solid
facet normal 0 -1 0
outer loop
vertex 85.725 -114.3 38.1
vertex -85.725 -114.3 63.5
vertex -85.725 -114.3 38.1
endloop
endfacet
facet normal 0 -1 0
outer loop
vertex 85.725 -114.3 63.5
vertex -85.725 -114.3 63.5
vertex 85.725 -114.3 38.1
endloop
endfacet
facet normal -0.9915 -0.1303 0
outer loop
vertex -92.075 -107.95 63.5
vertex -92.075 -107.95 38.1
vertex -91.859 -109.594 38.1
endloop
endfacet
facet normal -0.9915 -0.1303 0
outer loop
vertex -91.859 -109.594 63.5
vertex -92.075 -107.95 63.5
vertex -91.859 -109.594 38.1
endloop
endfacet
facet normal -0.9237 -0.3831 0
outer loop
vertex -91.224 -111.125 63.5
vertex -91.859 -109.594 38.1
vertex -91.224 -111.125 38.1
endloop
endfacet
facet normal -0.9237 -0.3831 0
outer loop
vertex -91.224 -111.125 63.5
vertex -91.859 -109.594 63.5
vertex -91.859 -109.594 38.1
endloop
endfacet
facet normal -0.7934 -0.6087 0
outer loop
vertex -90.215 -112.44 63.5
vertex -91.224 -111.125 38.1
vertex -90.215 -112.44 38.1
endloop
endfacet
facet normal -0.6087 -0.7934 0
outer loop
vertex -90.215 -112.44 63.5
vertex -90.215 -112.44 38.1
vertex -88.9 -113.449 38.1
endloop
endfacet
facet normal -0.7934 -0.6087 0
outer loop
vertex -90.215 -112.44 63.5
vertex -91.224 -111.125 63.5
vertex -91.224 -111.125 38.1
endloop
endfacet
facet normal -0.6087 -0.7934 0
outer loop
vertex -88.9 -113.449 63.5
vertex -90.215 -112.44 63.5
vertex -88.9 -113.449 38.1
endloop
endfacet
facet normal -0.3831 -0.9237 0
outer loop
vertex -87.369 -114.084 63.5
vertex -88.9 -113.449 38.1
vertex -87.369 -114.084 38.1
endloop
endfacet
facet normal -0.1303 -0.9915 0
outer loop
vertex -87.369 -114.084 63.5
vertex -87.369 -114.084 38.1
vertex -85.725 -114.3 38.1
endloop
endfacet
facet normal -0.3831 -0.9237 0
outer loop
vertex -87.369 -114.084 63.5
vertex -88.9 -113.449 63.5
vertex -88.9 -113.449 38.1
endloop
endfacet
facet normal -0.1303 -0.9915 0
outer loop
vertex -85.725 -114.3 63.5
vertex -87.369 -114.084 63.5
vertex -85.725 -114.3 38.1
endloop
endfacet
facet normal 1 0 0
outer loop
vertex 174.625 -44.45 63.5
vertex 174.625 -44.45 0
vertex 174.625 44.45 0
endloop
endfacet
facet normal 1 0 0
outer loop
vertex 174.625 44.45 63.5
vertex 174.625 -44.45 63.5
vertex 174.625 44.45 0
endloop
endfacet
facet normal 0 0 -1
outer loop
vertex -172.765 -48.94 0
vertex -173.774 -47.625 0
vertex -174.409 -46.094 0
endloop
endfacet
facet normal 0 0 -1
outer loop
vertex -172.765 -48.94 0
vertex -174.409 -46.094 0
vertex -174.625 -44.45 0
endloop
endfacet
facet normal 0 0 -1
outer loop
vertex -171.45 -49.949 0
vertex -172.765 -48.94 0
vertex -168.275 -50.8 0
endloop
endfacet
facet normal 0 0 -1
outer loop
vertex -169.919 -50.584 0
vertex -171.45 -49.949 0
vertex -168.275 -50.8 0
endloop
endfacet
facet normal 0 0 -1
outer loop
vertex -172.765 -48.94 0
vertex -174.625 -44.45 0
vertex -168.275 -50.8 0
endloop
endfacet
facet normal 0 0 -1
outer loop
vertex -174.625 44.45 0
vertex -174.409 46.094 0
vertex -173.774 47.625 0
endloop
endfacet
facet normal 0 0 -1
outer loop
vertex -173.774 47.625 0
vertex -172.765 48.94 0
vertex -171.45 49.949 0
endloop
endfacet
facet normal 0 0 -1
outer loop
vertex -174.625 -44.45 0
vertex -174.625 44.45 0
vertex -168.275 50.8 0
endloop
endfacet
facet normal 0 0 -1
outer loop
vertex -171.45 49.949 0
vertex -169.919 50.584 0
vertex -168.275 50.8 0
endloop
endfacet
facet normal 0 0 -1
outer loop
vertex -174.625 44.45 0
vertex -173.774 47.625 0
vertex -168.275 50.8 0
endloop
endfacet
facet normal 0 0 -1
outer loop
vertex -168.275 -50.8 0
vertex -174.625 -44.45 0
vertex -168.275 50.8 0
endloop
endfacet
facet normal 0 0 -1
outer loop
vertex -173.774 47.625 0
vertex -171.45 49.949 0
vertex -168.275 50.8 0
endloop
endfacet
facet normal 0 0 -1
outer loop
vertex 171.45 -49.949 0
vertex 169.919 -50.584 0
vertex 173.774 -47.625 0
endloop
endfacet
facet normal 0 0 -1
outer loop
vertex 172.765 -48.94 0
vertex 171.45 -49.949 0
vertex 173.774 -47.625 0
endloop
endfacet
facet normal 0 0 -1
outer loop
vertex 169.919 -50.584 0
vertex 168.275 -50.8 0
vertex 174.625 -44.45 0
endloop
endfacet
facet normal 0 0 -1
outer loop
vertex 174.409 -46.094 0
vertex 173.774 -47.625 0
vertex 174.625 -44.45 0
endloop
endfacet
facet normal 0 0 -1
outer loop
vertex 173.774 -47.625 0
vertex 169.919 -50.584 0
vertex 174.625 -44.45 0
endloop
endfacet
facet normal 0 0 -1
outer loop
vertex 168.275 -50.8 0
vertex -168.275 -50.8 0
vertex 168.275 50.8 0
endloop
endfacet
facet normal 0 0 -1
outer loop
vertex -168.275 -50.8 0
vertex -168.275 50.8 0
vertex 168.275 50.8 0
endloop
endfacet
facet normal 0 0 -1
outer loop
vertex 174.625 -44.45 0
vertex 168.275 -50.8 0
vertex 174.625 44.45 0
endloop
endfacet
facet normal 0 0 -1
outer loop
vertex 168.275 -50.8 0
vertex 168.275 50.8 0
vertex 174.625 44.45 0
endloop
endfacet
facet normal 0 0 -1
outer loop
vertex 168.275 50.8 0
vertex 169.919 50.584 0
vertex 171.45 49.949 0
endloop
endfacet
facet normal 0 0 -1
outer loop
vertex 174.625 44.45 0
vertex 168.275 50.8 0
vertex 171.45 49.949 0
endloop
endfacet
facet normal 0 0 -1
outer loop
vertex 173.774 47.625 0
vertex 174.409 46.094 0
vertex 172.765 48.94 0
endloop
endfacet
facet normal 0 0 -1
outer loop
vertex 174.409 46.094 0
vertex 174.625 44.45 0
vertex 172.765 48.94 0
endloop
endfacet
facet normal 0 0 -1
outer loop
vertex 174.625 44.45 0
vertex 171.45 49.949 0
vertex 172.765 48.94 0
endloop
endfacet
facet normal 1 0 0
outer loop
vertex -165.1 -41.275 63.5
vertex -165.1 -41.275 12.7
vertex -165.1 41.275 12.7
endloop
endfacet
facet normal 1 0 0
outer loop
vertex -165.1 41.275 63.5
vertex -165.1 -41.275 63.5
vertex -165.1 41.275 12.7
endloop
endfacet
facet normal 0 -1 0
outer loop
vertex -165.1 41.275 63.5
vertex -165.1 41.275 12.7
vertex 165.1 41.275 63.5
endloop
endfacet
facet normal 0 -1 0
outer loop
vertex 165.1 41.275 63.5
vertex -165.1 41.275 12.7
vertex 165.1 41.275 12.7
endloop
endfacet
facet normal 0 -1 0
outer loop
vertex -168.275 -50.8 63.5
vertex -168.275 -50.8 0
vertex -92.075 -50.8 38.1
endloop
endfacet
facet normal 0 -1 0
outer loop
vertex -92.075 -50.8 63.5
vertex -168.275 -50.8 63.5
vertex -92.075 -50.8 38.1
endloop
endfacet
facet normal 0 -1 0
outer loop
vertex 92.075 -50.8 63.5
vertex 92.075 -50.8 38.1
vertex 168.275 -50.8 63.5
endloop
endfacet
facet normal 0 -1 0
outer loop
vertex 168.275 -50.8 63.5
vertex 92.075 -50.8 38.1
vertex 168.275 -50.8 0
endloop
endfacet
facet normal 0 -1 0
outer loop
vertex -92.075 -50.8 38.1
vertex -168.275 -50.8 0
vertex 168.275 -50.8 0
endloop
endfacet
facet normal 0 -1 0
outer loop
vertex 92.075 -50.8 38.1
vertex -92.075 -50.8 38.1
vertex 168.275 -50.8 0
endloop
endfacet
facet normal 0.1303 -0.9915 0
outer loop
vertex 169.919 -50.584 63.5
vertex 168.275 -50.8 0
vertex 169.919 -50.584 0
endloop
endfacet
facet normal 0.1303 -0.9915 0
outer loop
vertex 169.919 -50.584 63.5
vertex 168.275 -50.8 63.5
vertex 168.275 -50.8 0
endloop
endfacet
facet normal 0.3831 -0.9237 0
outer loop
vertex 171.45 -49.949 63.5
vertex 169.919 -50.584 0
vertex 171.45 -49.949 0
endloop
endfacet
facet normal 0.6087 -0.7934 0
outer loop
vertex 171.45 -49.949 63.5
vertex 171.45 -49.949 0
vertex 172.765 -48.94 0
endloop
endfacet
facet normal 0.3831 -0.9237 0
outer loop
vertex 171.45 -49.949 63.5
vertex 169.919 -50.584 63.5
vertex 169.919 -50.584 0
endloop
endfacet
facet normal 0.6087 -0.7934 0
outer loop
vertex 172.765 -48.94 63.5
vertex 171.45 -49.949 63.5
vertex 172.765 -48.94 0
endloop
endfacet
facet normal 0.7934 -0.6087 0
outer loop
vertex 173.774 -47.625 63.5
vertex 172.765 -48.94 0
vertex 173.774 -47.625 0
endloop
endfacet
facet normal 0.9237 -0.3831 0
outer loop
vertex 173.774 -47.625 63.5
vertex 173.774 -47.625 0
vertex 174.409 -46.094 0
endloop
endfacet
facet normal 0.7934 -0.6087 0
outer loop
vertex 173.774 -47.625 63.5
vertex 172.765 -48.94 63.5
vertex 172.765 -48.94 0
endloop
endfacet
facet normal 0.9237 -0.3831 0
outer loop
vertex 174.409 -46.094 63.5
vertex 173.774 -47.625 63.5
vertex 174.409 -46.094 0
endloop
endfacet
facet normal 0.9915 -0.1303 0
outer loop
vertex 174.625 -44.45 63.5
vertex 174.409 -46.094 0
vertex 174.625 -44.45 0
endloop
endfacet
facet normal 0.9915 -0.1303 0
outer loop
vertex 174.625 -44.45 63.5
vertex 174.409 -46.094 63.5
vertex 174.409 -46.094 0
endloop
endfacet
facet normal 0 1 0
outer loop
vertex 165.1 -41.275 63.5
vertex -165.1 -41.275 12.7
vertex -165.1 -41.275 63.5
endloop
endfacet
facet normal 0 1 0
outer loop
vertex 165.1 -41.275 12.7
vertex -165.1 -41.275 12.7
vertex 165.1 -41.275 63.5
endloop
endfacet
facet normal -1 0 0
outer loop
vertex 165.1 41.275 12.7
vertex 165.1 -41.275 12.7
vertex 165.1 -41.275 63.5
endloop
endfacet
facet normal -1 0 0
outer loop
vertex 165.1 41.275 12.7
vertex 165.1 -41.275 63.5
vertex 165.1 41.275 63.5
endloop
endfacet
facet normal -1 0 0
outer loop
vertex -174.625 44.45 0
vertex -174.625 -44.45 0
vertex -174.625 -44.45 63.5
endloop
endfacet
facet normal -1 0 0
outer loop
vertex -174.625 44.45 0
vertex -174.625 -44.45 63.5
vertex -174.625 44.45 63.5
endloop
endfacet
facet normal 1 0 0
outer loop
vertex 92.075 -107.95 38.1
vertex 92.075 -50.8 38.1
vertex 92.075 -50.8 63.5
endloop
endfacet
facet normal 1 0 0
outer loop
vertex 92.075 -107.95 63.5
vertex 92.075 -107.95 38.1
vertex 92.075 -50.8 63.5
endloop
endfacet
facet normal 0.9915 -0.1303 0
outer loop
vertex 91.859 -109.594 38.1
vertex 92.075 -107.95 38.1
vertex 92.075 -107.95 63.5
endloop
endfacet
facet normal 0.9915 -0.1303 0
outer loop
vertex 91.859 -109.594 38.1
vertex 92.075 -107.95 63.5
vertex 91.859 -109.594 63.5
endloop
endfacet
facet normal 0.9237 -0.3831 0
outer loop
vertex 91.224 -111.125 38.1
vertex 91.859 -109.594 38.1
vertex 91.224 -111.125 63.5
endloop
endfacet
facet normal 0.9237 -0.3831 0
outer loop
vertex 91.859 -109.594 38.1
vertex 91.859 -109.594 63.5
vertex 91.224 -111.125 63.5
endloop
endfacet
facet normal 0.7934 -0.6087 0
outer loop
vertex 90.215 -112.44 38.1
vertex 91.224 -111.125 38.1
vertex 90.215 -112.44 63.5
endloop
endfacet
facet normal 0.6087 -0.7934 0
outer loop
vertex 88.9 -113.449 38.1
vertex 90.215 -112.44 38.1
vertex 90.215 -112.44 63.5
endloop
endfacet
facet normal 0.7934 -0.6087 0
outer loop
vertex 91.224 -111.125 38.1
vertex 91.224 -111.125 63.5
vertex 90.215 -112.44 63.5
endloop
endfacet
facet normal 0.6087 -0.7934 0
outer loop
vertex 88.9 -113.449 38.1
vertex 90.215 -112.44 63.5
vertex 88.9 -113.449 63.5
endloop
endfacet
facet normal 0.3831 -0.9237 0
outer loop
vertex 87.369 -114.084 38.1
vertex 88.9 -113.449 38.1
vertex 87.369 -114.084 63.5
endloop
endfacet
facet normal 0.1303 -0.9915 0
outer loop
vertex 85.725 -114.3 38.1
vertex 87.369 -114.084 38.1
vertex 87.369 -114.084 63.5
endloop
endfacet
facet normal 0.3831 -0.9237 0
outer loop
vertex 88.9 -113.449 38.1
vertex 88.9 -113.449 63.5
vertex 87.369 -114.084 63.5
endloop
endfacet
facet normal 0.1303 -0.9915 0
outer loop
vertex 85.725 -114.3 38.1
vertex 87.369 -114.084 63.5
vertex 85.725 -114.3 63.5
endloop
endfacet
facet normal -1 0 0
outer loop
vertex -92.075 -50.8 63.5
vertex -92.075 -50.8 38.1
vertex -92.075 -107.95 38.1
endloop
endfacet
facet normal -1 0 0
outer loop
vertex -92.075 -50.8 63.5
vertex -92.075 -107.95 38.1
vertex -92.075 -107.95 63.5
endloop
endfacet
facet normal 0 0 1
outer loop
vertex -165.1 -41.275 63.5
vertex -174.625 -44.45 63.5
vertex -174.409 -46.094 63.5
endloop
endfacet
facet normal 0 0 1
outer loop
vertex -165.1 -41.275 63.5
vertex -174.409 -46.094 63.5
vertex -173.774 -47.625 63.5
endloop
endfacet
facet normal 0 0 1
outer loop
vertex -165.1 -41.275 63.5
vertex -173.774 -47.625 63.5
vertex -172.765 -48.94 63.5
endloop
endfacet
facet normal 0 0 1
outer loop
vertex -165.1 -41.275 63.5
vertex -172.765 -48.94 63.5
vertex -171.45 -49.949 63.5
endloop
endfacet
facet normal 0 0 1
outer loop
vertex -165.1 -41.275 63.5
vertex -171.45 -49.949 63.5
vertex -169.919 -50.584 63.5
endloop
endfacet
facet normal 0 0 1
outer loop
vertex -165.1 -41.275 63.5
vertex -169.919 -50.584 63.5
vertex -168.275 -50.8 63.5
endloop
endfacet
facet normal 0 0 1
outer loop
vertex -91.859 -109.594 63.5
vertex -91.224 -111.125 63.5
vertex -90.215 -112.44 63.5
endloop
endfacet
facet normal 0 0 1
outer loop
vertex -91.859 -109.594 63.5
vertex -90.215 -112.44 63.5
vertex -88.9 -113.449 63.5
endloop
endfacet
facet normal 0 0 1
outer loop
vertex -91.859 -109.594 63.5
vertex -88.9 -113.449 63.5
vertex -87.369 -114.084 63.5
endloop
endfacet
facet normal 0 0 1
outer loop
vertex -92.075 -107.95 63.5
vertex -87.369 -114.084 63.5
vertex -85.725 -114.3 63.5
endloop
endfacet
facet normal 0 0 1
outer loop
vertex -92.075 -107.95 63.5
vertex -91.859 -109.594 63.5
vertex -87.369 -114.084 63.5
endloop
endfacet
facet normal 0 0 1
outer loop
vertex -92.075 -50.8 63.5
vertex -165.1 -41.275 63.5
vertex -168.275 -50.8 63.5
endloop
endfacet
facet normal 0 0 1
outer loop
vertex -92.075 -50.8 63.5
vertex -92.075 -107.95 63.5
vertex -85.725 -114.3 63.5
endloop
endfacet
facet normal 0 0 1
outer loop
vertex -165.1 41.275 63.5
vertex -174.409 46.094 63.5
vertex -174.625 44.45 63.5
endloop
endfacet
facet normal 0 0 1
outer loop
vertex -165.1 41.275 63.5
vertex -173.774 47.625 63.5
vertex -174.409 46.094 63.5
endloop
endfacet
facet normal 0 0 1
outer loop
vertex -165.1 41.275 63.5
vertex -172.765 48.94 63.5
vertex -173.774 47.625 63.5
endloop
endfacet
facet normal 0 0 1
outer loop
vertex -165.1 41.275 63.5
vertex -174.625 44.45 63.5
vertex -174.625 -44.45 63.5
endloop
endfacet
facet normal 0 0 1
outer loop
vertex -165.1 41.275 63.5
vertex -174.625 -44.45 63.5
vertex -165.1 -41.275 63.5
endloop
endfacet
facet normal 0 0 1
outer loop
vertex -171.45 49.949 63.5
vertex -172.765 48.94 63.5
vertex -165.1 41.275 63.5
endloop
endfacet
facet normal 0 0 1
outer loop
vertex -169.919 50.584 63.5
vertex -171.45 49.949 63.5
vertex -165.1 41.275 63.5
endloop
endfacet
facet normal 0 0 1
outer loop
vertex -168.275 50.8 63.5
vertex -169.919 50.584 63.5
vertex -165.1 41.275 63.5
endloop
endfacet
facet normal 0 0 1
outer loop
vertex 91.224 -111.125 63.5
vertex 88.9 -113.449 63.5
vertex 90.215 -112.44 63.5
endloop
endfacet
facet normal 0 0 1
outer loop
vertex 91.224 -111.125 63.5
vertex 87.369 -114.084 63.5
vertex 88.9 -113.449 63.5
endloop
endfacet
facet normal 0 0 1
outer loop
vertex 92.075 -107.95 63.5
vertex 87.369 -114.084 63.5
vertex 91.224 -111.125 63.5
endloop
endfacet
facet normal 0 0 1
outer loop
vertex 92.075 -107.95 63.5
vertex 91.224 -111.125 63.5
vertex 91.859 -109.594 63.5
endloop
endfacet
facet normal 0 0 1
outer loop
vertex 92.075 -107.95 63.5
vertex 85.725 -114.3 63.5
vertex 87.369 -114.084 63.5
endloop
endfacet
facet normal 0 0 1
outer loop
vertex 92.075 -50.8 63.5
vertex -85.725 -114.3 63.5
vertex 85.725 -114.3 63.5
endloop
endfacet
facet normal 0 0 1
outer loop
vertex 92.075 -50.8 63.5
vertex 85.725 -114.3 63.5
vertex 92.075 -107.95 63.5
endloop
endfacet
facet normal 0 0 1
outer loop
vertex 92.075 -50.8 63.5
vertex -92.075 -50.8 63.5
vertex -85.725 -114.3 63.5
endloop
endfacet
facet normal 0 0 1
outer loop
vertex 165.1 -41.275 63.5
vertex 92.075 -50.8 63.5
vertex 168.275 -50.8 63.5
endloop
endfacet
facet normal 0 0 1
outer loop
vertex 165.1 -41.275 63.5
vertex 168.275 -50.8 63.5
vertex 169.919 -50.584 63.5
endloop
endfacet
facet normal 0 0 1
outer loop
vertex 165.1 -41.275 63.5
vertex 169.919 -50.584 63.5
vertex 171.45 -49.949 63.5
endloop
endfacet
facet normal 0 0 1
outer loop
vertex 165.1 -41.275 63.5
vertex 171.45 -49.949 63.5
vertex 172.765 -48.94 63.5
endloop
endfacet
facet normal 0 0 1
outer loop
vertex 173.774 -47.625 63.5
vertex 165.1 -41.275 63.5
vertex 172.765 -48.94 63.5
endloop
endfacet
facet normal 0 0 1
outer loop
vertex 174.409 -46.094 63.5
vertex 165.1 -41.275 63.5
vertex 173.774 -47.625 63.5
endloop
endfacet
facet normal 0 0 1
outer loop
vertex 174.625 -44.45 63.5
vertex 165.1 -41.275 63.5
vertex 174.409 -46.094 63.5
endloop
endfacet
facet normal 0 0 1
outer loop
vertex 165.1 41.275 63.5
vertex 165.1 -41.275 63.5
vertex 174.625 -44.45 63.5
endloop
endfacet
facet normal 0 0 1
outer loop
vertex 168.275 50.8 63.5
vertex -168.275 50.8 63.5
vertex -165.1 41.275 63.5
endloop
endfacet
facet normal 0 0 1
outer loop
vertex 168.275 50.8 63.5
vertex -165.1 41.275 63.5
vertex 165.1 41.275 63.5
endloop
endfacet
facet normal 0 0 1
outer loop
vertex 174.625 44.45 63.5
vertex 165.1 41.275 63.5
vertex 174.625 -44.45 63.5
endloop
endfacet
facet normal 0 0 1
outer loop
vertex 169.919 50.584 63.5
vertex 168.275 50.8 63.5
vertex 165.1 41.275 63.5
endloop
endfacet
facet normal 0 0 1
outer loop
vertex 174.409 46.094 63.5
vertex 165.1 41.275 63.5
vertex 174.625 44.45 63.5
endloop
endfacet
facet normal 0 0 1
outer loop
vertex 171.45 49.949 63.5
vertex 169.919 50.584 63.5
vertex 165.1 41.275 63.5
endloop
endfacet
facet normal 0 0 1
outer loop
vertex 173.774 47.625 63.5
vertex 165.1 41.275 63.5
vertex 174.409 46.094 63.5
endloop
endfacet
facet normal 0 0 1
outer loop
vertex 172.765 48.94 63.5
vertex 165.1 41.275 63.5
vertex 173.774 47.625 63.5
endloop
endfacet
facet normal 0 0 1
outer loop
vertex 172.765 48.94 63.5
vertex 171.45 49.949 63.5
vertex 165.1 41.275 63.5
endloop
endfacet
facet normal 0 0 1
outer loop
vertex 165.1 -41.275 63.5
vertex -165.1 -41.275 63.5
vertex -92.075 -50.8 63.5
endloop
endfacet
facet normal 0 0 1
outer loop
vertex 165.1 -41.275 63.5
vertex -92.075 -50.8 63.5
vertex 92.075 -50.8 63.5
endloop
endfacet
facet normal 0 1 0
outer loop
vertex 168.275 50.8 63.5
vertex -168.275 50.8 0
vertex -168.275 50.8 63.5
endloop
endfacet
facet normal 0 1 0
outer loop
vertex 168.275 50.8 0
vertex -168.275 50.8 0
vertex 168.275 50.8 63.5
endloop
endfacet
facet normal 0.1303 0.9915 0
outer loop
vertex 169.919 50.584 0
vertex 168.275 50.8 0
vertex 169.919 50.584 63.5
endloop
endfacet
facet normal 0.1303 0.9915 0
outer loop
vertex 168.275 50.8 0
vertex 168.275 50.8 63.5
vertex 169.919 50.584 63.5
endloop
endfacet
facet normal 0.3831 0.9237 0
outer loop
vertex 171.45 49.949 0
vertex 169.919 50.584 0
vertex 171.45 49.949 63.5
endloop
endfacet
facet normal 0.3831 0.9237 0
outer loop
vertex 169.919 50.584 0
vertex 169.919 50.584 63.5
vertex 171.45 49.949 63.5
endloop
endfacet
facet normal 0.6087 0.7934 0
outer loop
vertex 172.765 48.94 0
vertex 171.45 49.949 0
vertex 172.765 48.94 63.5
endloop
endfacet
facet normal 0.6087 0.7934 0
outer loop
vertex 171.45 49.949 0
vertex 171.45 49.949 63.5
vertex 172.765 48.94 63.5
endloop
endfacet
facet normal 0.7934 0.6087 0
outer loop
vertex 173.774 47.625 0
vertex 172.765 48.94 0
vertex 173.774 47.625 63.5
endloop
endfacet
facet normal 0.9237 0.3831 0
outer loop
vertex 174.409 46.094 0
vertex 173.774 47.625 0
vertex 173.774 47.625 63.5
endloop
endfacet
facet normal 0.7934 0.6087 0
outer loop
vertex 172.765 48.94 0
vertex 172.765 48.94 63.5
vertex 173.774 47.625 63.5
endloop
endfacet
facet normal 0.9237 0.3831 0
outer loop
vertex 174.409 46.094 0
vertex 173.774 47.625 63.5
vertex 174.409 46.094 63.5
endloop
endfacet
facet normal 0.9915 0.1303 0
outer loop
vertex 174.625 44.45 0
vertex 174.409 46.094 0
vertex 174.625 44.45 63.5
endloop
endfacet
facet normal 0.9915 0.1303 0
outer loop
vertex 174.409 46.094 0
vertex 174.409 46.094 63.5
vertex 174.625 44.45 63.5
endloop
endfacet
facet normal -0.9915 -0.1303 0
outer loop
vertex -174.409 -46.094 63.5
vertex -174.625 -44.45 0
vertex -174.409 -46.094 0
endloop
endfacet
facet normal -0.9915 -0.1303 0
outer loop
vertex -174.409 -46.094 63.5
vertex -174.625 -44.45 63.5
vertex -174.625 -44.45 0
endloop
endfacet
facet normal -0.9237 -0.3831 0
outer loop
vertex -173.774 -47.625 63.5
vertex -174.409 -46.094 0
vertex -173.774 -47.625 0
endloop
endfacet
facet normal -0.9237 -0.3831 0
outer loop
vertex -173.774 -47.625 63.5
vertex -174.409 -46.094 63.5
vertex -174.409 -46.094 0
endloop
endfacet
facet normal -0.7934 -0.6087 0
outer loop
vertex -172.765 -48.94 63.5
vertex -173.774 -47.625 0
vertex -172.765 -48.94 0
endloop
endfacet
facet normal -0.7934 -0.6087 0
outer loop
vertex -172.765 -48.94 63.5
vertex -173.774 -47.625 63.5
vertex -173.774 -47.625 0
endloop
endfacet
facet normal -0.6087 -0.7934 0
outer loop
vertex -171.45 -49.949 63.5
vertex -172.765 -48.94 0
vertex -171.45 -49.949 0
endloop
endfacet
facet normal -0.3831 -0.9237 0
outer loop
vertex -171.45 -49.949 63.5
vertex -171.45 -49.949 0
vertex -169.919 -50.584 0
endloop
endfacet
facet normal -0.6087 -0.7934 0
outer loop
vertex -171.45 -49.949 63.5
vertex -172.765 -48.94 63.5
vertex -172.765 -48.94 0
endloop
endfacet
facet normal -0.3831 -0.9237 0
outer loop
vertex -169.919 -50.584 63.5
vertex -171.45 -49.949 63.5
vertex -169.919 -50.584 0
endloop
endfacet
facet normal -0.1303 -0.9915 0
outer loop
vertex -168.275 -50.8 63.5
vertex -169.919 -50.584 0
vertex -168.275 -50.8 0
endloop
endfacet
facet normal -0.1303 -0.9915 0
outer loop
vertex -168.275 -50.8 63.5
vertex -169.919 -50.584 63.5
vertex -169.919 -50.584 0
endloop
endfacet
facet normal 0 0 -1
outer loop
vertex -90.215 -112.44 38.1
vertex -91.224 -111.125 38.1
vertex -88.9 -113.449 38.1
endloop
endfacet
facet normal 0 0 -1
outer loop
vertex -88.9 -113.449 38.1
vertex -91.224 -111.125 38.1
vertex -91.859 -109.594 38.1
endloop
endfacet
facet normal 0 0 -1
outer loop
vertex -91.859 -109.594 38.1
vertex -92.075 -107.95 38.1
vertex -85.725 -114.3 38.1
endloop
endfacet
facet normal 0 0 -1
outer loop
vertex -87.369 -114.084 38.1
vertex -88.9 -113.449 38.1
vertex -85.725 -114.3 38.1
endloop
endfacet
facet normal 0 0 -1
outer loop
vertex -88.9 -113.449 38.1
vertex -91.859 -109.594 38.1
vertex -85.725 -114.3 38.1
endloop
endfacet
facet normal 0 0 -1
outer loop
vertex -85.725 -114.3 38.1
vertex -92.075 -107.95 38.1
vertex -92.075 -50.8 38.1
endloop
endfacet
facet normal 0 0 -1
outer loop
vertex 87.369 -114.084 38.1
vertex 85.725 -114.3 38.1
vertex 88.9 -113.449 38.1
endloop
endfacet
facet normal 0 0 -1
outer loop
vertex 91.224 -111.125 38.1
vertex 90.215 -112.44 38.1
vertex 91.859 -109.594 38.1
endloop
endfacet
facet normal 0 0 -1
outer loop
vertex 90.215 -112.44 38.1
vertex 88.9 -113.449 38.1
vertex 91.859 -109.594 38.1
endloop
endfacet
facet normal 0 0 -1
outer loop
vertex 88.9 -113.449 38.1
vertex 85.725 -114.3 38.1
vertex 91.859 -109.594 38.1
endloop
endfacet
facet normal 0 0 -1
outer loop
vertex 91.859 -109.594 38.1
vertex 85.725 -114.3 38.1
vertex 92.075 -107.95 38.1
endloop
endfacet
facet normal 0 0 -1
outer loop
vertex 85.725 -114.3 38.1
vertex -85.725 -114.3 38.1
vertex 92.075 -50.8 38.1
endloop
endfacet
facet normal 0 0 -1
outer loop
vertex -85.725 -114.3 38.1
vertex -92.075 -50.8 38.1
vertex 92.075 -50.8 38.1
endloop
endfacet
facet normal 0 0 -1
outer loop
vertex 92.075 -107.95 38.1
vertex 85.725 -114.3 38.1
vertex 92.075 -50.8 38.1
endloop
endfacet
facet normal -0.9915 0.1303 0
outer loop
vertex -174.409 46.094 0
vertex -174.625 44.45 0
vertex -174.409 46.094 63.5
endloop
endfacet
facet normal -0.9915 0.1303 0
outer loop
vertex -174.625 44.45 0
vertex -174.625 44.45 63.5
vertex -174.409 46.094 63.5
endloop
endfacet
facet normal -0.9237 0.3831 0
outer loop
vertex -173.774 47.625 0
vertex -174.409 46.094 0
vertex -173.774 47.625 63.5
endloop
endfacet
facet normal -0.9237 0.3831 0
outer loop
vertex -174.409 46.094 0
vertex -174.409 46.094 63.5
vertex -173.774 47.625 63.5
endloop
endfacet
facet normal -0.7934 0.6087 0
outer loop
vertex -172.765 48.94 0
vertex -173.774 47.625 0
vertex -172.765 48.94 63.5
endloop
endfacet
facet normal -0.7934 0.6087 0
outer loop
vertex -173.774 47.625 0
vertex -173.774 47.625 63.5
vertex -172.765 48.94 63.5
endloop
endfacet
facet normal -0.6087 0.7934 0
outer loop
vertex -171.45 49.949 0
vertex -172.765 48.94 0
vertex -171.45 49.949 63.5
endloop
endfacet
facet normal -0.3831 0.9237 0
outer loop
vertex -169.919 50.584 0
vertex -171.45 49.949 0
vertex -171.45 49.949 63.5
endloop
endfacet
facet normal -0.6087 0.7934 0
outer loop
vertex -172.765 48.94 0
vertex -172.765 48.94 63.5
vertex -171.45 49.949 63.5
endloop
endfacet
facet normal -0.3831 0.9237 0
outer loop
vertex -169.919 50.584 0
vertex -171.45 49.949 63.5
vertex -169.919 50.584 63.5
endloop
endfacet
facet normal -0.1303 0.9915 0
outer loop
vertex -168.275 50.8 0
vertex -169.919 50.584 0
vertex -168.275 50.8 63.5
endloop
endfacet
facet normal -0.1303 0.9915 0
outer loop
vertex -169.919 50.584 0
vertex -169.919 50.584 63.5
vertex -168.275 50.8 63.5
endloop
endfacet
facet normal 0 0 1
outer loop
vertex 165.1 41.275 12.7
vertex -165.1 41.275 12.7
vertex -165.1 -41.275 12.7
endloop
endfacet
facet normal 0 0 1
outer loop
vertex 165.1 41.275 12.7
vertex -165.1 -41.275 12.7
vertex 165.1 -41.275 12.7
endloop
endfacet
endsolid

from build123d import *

# Parameters (mm, degrees)
F0_W     = 349.25
F0_H     = 101.6
F0_W_2   = 330.2
F0_H_2   = 82.55
F1_DEPTH = 63.5
F2_R     = 6.35
F3_W     = 330.2
F3_H     = 82.55
F4_DEPTH = 12.7
F5_W     = 184.15
F5_H     = 25.4
F6_DEPTH = 63.5
F7_R     = 6.35


with BuildPart() as f1:
    # F0 (on Top) → F1 (new body)
    with BuildSketch(Plane.XY):
        Rectangle(F0_W, F0_H)
        Rectangle(F0_W_2, F0_H_2, mode=Mode.SUBTRACT)
    extrude(amount=F1_DEPTH)

    # F2
    f2_edges = [f1.edges().sort_by_distance(p)[0] for p in [
        (-174.625, -50.8, 31.75),
        (174.625, -50.8, 31.75),
        (174.625, 50.8, 31.75),
        (-174.625, 50.8, 31.75),
    ]]
    fillet(f2_edges, radius=F2_R)

    # F3 (on Top) → F4 (join)
    with BuildSketch(Plane.XY):
        Rectangle(F3_W, F3_H)
    extrude(amount=F4_DEPTH)

    # F5 (on face) → F6 (join)
    with BuildSketch(Plane.XZ.offset(50.8)):
        with Locations((0, 50.8)):
            Rectangle(F5_W, F5_H)
    extrude(amount=F6_DEPTH)

    # F7
    f7_edges = [f1.edges().sort_by_distance(p)[0] for p in [
        (-92.075, -114.3, 50.8),
        (92.075, -114.3, 50.8),
    ]]
    fillet(f7_edges, radius=F7_R)


solid = f1.part
